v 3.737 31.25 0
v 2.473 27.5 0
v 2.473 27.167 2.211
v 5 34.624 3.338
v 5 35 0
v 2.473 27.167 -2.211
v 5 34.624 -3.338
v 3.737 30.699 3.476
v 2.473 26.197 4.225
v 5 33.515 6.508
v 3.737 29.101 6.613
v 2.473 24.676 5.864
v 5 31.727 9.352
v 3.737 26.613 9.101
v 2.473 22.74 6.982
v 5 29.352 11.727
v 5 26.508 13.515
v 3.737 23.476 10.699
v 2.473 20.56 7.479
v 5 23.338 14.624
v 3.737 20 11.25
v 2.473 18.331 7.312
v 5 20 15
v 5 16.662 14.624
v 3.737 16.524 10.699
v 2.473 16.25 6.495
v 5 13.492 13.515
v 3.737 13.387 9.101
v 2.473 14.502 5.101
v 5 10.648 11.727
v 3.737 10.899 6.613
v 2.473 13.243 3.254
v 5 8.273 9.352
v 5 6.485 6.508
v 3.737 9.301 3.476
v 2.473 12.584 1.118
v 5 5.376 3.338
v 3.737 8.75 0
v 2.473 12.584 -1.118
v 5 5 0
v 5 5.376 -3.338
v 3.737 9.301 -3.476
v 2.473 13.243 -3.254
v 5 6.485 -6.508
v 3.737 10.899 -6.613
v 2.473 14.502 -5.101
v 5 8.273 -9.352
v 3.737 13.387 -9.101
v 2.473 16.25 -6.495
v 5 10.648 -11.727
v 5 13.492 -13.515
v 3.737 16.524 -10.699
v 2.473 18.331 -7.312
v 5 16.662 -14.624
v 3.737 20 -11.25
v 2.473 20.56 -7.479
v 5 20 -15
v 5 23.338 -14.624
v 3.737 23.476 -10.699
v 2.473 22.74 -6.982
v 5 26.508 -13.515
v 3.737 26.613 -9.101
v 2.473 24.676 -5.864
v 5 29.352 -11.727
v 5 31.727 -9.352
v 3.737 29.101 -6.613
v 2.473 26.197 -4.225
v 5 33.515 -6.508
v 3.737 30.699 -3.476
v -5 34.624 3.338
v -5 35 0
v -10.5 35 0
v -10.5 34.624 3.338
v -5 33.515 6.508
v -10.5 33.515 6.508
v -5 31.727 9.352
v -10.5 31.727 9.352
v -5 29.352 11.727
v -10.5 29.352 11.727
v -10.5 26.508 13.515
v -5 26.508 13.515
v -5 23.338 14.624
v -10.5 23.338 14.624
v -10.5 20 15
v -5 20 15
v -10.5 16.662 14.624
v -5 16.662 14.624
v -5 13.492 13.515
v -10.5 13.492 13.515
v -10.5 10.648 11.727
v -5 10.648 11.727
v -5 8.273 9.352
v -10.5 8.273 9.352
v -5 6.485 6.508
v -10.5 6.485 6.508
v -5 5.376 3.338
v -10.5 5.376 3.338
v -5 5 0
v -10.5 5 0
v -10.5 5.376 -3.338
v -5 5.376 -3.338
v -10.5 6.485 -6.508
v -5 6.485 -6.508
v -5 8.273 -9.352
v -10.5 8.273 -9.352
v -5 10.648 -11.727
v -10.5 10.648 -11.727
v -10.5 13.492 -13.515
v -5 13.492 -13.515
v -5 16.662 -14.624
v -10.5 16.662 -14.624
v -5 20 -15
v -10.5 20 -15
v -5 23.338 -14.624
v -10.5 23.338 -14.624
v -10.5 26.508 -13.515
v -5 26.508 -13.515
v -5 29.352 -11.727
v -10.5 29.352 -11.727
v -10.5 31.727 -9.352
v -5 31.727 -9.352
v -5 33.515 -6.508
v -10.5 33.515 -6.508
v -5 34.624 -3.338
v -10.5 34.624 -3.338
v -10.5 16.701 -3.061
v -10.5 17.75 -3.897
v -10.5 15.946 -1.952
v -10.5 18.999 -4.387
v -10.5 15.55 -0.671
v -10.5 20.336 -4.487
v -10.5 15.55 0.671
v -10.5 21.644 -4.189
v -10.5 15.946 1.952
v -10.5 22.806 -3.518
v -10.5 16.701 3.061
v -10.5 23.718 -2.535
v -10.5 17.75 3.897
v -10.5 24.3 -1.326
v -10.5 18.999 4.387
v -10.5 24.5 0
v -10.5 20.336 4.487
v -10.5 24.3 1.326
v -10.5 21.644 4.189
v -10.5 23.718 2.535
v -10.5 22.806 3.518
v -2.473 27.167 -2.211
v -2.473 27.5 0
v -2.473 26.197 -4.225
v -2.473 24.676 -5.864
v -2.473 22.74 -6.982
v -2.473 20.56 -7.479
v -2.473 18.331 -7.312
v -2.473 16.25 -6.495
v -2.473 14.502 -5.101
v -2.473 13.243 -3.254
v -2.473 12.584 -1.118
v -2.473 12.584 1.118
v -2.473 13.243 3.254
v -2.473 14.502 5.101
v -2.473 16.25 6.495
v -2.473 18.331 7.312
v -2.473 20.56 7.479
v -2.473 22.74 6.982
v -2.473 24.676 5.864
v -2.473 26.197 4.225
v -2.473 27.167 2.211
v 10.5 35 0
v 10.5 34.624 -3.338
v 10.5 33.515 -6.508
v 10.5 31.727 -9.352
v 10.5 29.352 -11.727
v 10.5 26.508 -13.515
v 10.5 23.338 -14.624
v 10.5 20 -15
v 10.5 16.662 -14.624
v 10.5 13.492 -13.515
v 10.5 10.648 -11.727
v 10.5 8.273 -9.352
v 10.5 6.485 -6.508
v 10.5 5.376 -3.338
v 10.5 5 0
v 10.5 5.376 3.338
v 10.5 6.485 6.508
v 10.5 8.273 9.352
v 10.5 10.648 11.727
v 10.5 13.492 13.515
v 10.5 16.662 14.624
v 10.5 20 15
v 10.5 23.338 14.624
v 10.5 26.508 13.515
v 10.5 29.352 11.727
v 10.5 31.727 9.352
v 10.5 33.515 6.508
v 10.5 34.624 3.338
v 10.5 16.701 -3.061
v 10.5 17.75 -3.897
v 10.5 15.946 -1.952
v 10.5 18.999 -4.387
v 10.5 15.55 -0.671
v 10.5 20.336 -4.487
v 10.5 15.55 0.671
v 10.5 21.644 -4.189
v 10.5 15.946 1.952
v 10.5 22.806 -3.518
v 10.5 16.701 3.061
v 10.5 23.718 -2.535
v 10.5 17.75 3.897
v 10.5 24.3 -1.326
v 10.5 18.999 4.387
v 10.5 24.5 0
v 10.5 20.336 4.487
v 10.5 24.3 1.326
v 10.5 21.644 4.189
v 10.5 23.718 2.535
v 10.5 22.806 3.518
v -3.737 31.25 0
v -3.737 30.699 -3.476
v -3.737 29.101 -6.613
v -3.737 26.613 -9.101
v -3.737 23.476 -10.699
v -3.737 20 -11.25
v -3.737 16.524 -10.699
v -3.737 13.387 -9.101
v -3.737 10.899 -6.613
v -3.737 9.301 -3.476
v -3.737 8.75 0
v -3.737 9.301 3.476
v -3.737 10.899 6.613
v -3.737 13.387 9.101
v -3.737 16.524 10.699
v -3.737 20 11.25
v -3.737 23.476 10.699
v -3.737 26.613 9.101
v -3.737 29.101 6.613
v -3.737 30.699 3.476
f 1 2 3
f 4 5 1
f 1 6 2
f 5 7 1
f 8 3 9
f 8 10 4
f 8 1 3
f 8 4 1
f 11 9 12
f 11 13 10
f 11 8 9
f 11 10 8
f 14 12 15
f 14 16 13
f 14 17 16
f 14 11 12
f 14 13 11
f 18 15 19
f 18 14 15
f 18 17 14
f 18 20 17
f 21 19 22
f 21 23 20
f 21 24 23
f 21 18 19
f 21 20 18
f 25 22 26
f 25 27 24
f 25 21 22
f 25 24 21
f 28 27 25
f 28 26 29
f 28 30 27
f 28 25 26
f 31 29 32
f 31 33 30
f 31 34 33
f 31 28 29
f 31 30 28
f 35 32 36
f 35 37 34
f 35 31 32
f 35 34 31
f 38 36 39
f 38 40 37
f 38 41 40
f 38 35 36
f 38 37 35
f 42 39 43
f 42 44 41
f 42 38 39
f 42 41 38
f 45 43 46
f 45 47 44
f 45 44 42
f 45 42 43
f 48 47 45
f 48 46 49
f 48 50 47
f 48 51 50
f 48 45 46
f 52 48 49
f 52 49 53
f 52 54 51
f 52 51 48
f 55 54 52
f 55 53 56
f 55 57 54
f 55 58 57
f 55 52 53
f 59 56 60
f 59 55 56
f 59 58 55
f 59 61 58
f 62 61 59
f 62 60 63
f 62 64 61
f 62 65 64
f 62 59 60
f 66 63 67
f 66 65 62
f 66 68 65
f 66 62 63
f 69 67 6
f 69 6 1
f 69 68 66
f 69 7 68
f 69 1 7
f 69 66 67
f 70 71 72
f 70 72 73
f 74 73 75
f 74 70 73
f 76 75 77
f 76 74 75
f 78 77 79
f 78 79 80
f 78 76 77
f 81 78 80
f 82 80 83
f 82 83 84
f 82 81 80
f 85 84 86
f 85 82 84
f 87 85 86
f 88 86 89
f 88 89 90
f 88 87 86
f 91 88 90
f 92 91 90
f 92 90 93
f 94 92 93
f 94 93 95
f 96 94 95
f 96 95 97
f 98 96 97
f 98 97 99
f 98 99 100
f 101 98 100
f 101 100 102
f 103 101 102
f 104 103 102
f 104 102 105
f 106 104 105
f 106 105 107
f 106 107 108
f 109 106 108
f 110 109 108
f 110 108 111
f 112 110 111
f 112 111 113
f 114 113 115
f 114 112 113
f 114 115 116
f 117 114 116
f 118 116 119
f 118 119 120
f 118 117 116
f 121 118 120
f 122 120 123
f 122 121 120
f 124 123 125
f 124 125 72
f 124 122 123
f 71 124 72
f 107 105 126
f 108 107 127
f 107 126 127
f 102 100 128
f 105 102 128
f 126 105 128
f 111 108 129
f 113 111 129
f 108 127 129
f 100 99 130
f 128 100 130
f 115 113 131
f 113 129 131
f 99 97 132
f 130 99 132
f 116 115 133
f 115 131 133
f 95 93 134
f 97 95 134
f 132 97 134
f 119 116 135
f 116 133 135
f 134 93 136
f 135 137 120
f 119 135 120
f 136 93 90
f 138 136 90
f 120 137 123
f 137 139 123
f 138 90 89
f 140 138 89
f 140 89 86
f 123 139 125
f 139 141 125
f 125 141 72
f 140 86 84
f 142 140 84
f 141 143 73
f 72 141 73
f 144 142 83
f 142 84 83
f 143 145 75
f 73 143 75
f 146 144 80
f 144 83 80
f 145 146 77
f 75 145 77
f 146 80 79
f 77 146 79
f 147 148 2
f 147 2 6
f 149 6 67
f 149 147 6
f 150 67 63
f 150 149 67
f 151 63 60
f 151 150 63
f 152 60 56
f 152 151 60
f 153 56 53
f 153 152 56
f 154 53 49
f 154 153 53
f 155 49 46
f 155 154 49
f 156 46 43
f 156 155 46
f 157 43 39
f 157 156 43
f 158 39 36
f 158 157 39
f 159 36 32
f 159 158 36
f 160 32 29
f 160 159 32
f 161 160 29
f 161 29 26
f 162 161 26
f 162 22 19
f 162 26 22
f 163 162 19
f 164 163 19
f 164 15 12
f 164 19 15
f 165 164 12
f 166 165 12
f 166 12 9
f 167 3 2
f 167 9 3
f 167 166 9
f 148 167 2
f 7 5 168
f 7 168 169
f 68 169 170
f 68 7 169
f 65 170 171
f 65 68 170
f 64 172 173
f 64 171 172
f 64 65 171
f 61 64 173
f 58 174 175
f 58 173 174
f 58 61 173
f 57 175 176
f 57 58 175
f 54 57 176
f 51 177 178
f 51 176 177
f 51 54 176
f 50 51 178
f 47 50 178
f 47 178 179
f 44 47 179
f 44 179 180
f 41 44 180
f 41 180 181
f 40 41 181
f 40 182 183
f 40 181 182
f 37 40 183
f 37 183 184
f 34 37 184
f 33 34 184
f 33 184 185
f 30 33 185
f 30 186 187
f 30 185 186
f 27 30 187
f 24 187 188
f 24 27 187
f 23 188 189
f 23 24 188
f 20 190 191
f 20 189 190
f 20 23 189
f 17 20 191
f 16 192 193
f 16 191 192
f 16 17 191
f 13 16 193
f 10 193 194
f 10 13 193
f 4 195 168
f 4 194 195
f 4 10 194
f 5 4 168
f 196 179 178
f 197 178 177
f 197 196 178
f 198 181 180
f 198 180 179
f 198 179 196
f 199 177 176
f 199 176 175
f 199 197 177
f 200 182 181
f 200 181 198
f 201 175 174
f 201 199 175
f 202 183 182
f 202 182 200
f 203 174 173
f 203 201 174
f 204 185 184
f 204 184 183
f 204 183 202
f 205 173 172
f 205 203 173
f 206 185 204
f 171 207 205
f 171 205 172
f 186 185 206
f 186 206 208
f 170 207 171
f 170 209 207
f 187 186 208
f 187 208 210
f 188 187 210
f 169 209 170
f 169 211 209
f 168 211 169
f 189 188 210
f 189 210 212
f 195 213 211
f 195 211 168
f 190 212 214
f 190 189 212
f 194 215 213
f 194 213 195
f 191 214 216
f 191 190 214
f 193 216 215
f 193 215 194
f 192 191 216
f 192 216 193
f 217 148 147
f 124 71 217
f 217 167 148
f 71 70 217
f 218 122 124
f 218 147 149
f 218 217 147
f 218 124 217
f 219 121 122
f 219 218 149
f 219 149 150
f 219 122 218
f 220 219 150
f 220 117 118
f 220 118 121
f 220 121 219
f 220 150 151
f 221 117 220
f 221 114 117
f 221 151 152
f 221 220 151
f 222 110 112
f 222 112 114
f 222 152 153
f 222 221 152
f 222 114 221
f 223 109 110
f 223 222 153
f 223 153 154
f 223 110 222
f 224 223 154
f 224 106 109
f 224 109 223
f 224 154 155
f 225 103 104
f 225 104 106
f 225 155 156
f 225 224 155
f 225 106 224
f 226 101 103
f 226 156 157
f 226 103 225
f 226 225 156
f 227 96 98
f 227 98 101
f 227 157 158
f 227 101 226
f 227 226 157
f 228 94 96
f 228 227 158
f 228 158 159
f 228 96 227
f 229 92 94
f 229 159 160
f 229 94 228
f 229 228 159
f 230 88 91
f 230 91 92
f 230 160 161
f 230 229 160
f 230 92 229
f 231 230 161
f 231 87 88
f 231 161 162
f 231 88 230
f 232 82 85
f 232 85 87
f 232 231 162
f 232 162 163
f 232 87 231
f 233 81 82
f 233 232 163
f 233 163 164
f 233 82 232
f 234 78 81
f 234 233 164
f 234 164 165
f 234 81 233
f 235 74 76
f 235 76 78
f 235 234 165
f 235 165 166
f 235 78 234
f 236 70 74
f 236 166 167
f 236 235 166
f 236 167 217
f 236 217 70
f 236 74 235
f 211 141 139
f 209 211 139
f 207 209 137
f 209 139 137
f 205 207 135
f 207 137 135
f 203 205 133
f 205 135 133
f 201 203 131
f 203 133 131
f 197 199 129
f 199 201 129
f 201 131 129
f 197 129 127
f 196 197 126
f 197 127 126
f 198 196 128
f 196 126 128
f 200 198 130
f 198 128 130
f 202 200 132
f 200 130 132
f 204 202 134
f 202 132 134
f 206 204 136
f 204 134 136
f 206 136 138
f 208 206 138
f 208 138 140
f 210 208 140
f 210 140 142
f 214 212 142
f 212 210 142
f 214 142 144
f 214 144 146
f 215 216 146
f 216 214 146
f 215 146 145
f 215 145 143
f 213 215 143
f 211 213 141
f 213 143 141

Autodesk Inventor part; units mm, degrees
ref_plane "YZ Plane" through (0, 0, 0) normal (1, 0, 0) x (0, 1, 0)
ref_plane "XZ Plane" through (0, 0, 0) normal (0, 1, 0) x (-1, 0, 0)
ref_plane "XY Plane" through (0, 0, 0) normal (0, 0, 1) x (1, 0, 0)
sketch "Sketch1" plane through (0, 0, 0) normal (0, 0, 1) x (1, 0, 0)
  line L0 (10.5, 24.5) -> (-10.5, 24.5)
  line L1 (-10.5, 24.5) -> (-10.5, 35)
  line L2 (10.5, 24.5) -> (10.5, 35)
  line L3 (-10.5, 35) -> (-5, 35)
  line L4 (10.5, 35) -> (5, 35)
  line L5 (2.4732, 27.5) -> (-2.4732, 27.5)
  line L6 (-5, 35) -> (6.4911, 35) construction
  line L7 (5, 35) -> (16.4911, 35) construction
  line L8 (-25.5367, 20) -> (30.733, 20)
  line L9 (-5, 35) -> (-2.4732, 27.5)
  line L10 (2.4732, 27.5) -> (5, 35)
  point P0 (0, 0)
  dimension "d2" = 21
  dimension "d4" = 5.5
  dimension "d5" = 5.5
  dimension "d44" = 9
  dimension "d48" = 15
  dimension "d49" = 30
  dimension "d50" = 30
revolve "Revolution1" add sketch "Sketch1" angle 360 about axis through (-25.5367, 20, 0) along (1, 0, 0)
properties part number "Pulley" material "ABS Plastic"
